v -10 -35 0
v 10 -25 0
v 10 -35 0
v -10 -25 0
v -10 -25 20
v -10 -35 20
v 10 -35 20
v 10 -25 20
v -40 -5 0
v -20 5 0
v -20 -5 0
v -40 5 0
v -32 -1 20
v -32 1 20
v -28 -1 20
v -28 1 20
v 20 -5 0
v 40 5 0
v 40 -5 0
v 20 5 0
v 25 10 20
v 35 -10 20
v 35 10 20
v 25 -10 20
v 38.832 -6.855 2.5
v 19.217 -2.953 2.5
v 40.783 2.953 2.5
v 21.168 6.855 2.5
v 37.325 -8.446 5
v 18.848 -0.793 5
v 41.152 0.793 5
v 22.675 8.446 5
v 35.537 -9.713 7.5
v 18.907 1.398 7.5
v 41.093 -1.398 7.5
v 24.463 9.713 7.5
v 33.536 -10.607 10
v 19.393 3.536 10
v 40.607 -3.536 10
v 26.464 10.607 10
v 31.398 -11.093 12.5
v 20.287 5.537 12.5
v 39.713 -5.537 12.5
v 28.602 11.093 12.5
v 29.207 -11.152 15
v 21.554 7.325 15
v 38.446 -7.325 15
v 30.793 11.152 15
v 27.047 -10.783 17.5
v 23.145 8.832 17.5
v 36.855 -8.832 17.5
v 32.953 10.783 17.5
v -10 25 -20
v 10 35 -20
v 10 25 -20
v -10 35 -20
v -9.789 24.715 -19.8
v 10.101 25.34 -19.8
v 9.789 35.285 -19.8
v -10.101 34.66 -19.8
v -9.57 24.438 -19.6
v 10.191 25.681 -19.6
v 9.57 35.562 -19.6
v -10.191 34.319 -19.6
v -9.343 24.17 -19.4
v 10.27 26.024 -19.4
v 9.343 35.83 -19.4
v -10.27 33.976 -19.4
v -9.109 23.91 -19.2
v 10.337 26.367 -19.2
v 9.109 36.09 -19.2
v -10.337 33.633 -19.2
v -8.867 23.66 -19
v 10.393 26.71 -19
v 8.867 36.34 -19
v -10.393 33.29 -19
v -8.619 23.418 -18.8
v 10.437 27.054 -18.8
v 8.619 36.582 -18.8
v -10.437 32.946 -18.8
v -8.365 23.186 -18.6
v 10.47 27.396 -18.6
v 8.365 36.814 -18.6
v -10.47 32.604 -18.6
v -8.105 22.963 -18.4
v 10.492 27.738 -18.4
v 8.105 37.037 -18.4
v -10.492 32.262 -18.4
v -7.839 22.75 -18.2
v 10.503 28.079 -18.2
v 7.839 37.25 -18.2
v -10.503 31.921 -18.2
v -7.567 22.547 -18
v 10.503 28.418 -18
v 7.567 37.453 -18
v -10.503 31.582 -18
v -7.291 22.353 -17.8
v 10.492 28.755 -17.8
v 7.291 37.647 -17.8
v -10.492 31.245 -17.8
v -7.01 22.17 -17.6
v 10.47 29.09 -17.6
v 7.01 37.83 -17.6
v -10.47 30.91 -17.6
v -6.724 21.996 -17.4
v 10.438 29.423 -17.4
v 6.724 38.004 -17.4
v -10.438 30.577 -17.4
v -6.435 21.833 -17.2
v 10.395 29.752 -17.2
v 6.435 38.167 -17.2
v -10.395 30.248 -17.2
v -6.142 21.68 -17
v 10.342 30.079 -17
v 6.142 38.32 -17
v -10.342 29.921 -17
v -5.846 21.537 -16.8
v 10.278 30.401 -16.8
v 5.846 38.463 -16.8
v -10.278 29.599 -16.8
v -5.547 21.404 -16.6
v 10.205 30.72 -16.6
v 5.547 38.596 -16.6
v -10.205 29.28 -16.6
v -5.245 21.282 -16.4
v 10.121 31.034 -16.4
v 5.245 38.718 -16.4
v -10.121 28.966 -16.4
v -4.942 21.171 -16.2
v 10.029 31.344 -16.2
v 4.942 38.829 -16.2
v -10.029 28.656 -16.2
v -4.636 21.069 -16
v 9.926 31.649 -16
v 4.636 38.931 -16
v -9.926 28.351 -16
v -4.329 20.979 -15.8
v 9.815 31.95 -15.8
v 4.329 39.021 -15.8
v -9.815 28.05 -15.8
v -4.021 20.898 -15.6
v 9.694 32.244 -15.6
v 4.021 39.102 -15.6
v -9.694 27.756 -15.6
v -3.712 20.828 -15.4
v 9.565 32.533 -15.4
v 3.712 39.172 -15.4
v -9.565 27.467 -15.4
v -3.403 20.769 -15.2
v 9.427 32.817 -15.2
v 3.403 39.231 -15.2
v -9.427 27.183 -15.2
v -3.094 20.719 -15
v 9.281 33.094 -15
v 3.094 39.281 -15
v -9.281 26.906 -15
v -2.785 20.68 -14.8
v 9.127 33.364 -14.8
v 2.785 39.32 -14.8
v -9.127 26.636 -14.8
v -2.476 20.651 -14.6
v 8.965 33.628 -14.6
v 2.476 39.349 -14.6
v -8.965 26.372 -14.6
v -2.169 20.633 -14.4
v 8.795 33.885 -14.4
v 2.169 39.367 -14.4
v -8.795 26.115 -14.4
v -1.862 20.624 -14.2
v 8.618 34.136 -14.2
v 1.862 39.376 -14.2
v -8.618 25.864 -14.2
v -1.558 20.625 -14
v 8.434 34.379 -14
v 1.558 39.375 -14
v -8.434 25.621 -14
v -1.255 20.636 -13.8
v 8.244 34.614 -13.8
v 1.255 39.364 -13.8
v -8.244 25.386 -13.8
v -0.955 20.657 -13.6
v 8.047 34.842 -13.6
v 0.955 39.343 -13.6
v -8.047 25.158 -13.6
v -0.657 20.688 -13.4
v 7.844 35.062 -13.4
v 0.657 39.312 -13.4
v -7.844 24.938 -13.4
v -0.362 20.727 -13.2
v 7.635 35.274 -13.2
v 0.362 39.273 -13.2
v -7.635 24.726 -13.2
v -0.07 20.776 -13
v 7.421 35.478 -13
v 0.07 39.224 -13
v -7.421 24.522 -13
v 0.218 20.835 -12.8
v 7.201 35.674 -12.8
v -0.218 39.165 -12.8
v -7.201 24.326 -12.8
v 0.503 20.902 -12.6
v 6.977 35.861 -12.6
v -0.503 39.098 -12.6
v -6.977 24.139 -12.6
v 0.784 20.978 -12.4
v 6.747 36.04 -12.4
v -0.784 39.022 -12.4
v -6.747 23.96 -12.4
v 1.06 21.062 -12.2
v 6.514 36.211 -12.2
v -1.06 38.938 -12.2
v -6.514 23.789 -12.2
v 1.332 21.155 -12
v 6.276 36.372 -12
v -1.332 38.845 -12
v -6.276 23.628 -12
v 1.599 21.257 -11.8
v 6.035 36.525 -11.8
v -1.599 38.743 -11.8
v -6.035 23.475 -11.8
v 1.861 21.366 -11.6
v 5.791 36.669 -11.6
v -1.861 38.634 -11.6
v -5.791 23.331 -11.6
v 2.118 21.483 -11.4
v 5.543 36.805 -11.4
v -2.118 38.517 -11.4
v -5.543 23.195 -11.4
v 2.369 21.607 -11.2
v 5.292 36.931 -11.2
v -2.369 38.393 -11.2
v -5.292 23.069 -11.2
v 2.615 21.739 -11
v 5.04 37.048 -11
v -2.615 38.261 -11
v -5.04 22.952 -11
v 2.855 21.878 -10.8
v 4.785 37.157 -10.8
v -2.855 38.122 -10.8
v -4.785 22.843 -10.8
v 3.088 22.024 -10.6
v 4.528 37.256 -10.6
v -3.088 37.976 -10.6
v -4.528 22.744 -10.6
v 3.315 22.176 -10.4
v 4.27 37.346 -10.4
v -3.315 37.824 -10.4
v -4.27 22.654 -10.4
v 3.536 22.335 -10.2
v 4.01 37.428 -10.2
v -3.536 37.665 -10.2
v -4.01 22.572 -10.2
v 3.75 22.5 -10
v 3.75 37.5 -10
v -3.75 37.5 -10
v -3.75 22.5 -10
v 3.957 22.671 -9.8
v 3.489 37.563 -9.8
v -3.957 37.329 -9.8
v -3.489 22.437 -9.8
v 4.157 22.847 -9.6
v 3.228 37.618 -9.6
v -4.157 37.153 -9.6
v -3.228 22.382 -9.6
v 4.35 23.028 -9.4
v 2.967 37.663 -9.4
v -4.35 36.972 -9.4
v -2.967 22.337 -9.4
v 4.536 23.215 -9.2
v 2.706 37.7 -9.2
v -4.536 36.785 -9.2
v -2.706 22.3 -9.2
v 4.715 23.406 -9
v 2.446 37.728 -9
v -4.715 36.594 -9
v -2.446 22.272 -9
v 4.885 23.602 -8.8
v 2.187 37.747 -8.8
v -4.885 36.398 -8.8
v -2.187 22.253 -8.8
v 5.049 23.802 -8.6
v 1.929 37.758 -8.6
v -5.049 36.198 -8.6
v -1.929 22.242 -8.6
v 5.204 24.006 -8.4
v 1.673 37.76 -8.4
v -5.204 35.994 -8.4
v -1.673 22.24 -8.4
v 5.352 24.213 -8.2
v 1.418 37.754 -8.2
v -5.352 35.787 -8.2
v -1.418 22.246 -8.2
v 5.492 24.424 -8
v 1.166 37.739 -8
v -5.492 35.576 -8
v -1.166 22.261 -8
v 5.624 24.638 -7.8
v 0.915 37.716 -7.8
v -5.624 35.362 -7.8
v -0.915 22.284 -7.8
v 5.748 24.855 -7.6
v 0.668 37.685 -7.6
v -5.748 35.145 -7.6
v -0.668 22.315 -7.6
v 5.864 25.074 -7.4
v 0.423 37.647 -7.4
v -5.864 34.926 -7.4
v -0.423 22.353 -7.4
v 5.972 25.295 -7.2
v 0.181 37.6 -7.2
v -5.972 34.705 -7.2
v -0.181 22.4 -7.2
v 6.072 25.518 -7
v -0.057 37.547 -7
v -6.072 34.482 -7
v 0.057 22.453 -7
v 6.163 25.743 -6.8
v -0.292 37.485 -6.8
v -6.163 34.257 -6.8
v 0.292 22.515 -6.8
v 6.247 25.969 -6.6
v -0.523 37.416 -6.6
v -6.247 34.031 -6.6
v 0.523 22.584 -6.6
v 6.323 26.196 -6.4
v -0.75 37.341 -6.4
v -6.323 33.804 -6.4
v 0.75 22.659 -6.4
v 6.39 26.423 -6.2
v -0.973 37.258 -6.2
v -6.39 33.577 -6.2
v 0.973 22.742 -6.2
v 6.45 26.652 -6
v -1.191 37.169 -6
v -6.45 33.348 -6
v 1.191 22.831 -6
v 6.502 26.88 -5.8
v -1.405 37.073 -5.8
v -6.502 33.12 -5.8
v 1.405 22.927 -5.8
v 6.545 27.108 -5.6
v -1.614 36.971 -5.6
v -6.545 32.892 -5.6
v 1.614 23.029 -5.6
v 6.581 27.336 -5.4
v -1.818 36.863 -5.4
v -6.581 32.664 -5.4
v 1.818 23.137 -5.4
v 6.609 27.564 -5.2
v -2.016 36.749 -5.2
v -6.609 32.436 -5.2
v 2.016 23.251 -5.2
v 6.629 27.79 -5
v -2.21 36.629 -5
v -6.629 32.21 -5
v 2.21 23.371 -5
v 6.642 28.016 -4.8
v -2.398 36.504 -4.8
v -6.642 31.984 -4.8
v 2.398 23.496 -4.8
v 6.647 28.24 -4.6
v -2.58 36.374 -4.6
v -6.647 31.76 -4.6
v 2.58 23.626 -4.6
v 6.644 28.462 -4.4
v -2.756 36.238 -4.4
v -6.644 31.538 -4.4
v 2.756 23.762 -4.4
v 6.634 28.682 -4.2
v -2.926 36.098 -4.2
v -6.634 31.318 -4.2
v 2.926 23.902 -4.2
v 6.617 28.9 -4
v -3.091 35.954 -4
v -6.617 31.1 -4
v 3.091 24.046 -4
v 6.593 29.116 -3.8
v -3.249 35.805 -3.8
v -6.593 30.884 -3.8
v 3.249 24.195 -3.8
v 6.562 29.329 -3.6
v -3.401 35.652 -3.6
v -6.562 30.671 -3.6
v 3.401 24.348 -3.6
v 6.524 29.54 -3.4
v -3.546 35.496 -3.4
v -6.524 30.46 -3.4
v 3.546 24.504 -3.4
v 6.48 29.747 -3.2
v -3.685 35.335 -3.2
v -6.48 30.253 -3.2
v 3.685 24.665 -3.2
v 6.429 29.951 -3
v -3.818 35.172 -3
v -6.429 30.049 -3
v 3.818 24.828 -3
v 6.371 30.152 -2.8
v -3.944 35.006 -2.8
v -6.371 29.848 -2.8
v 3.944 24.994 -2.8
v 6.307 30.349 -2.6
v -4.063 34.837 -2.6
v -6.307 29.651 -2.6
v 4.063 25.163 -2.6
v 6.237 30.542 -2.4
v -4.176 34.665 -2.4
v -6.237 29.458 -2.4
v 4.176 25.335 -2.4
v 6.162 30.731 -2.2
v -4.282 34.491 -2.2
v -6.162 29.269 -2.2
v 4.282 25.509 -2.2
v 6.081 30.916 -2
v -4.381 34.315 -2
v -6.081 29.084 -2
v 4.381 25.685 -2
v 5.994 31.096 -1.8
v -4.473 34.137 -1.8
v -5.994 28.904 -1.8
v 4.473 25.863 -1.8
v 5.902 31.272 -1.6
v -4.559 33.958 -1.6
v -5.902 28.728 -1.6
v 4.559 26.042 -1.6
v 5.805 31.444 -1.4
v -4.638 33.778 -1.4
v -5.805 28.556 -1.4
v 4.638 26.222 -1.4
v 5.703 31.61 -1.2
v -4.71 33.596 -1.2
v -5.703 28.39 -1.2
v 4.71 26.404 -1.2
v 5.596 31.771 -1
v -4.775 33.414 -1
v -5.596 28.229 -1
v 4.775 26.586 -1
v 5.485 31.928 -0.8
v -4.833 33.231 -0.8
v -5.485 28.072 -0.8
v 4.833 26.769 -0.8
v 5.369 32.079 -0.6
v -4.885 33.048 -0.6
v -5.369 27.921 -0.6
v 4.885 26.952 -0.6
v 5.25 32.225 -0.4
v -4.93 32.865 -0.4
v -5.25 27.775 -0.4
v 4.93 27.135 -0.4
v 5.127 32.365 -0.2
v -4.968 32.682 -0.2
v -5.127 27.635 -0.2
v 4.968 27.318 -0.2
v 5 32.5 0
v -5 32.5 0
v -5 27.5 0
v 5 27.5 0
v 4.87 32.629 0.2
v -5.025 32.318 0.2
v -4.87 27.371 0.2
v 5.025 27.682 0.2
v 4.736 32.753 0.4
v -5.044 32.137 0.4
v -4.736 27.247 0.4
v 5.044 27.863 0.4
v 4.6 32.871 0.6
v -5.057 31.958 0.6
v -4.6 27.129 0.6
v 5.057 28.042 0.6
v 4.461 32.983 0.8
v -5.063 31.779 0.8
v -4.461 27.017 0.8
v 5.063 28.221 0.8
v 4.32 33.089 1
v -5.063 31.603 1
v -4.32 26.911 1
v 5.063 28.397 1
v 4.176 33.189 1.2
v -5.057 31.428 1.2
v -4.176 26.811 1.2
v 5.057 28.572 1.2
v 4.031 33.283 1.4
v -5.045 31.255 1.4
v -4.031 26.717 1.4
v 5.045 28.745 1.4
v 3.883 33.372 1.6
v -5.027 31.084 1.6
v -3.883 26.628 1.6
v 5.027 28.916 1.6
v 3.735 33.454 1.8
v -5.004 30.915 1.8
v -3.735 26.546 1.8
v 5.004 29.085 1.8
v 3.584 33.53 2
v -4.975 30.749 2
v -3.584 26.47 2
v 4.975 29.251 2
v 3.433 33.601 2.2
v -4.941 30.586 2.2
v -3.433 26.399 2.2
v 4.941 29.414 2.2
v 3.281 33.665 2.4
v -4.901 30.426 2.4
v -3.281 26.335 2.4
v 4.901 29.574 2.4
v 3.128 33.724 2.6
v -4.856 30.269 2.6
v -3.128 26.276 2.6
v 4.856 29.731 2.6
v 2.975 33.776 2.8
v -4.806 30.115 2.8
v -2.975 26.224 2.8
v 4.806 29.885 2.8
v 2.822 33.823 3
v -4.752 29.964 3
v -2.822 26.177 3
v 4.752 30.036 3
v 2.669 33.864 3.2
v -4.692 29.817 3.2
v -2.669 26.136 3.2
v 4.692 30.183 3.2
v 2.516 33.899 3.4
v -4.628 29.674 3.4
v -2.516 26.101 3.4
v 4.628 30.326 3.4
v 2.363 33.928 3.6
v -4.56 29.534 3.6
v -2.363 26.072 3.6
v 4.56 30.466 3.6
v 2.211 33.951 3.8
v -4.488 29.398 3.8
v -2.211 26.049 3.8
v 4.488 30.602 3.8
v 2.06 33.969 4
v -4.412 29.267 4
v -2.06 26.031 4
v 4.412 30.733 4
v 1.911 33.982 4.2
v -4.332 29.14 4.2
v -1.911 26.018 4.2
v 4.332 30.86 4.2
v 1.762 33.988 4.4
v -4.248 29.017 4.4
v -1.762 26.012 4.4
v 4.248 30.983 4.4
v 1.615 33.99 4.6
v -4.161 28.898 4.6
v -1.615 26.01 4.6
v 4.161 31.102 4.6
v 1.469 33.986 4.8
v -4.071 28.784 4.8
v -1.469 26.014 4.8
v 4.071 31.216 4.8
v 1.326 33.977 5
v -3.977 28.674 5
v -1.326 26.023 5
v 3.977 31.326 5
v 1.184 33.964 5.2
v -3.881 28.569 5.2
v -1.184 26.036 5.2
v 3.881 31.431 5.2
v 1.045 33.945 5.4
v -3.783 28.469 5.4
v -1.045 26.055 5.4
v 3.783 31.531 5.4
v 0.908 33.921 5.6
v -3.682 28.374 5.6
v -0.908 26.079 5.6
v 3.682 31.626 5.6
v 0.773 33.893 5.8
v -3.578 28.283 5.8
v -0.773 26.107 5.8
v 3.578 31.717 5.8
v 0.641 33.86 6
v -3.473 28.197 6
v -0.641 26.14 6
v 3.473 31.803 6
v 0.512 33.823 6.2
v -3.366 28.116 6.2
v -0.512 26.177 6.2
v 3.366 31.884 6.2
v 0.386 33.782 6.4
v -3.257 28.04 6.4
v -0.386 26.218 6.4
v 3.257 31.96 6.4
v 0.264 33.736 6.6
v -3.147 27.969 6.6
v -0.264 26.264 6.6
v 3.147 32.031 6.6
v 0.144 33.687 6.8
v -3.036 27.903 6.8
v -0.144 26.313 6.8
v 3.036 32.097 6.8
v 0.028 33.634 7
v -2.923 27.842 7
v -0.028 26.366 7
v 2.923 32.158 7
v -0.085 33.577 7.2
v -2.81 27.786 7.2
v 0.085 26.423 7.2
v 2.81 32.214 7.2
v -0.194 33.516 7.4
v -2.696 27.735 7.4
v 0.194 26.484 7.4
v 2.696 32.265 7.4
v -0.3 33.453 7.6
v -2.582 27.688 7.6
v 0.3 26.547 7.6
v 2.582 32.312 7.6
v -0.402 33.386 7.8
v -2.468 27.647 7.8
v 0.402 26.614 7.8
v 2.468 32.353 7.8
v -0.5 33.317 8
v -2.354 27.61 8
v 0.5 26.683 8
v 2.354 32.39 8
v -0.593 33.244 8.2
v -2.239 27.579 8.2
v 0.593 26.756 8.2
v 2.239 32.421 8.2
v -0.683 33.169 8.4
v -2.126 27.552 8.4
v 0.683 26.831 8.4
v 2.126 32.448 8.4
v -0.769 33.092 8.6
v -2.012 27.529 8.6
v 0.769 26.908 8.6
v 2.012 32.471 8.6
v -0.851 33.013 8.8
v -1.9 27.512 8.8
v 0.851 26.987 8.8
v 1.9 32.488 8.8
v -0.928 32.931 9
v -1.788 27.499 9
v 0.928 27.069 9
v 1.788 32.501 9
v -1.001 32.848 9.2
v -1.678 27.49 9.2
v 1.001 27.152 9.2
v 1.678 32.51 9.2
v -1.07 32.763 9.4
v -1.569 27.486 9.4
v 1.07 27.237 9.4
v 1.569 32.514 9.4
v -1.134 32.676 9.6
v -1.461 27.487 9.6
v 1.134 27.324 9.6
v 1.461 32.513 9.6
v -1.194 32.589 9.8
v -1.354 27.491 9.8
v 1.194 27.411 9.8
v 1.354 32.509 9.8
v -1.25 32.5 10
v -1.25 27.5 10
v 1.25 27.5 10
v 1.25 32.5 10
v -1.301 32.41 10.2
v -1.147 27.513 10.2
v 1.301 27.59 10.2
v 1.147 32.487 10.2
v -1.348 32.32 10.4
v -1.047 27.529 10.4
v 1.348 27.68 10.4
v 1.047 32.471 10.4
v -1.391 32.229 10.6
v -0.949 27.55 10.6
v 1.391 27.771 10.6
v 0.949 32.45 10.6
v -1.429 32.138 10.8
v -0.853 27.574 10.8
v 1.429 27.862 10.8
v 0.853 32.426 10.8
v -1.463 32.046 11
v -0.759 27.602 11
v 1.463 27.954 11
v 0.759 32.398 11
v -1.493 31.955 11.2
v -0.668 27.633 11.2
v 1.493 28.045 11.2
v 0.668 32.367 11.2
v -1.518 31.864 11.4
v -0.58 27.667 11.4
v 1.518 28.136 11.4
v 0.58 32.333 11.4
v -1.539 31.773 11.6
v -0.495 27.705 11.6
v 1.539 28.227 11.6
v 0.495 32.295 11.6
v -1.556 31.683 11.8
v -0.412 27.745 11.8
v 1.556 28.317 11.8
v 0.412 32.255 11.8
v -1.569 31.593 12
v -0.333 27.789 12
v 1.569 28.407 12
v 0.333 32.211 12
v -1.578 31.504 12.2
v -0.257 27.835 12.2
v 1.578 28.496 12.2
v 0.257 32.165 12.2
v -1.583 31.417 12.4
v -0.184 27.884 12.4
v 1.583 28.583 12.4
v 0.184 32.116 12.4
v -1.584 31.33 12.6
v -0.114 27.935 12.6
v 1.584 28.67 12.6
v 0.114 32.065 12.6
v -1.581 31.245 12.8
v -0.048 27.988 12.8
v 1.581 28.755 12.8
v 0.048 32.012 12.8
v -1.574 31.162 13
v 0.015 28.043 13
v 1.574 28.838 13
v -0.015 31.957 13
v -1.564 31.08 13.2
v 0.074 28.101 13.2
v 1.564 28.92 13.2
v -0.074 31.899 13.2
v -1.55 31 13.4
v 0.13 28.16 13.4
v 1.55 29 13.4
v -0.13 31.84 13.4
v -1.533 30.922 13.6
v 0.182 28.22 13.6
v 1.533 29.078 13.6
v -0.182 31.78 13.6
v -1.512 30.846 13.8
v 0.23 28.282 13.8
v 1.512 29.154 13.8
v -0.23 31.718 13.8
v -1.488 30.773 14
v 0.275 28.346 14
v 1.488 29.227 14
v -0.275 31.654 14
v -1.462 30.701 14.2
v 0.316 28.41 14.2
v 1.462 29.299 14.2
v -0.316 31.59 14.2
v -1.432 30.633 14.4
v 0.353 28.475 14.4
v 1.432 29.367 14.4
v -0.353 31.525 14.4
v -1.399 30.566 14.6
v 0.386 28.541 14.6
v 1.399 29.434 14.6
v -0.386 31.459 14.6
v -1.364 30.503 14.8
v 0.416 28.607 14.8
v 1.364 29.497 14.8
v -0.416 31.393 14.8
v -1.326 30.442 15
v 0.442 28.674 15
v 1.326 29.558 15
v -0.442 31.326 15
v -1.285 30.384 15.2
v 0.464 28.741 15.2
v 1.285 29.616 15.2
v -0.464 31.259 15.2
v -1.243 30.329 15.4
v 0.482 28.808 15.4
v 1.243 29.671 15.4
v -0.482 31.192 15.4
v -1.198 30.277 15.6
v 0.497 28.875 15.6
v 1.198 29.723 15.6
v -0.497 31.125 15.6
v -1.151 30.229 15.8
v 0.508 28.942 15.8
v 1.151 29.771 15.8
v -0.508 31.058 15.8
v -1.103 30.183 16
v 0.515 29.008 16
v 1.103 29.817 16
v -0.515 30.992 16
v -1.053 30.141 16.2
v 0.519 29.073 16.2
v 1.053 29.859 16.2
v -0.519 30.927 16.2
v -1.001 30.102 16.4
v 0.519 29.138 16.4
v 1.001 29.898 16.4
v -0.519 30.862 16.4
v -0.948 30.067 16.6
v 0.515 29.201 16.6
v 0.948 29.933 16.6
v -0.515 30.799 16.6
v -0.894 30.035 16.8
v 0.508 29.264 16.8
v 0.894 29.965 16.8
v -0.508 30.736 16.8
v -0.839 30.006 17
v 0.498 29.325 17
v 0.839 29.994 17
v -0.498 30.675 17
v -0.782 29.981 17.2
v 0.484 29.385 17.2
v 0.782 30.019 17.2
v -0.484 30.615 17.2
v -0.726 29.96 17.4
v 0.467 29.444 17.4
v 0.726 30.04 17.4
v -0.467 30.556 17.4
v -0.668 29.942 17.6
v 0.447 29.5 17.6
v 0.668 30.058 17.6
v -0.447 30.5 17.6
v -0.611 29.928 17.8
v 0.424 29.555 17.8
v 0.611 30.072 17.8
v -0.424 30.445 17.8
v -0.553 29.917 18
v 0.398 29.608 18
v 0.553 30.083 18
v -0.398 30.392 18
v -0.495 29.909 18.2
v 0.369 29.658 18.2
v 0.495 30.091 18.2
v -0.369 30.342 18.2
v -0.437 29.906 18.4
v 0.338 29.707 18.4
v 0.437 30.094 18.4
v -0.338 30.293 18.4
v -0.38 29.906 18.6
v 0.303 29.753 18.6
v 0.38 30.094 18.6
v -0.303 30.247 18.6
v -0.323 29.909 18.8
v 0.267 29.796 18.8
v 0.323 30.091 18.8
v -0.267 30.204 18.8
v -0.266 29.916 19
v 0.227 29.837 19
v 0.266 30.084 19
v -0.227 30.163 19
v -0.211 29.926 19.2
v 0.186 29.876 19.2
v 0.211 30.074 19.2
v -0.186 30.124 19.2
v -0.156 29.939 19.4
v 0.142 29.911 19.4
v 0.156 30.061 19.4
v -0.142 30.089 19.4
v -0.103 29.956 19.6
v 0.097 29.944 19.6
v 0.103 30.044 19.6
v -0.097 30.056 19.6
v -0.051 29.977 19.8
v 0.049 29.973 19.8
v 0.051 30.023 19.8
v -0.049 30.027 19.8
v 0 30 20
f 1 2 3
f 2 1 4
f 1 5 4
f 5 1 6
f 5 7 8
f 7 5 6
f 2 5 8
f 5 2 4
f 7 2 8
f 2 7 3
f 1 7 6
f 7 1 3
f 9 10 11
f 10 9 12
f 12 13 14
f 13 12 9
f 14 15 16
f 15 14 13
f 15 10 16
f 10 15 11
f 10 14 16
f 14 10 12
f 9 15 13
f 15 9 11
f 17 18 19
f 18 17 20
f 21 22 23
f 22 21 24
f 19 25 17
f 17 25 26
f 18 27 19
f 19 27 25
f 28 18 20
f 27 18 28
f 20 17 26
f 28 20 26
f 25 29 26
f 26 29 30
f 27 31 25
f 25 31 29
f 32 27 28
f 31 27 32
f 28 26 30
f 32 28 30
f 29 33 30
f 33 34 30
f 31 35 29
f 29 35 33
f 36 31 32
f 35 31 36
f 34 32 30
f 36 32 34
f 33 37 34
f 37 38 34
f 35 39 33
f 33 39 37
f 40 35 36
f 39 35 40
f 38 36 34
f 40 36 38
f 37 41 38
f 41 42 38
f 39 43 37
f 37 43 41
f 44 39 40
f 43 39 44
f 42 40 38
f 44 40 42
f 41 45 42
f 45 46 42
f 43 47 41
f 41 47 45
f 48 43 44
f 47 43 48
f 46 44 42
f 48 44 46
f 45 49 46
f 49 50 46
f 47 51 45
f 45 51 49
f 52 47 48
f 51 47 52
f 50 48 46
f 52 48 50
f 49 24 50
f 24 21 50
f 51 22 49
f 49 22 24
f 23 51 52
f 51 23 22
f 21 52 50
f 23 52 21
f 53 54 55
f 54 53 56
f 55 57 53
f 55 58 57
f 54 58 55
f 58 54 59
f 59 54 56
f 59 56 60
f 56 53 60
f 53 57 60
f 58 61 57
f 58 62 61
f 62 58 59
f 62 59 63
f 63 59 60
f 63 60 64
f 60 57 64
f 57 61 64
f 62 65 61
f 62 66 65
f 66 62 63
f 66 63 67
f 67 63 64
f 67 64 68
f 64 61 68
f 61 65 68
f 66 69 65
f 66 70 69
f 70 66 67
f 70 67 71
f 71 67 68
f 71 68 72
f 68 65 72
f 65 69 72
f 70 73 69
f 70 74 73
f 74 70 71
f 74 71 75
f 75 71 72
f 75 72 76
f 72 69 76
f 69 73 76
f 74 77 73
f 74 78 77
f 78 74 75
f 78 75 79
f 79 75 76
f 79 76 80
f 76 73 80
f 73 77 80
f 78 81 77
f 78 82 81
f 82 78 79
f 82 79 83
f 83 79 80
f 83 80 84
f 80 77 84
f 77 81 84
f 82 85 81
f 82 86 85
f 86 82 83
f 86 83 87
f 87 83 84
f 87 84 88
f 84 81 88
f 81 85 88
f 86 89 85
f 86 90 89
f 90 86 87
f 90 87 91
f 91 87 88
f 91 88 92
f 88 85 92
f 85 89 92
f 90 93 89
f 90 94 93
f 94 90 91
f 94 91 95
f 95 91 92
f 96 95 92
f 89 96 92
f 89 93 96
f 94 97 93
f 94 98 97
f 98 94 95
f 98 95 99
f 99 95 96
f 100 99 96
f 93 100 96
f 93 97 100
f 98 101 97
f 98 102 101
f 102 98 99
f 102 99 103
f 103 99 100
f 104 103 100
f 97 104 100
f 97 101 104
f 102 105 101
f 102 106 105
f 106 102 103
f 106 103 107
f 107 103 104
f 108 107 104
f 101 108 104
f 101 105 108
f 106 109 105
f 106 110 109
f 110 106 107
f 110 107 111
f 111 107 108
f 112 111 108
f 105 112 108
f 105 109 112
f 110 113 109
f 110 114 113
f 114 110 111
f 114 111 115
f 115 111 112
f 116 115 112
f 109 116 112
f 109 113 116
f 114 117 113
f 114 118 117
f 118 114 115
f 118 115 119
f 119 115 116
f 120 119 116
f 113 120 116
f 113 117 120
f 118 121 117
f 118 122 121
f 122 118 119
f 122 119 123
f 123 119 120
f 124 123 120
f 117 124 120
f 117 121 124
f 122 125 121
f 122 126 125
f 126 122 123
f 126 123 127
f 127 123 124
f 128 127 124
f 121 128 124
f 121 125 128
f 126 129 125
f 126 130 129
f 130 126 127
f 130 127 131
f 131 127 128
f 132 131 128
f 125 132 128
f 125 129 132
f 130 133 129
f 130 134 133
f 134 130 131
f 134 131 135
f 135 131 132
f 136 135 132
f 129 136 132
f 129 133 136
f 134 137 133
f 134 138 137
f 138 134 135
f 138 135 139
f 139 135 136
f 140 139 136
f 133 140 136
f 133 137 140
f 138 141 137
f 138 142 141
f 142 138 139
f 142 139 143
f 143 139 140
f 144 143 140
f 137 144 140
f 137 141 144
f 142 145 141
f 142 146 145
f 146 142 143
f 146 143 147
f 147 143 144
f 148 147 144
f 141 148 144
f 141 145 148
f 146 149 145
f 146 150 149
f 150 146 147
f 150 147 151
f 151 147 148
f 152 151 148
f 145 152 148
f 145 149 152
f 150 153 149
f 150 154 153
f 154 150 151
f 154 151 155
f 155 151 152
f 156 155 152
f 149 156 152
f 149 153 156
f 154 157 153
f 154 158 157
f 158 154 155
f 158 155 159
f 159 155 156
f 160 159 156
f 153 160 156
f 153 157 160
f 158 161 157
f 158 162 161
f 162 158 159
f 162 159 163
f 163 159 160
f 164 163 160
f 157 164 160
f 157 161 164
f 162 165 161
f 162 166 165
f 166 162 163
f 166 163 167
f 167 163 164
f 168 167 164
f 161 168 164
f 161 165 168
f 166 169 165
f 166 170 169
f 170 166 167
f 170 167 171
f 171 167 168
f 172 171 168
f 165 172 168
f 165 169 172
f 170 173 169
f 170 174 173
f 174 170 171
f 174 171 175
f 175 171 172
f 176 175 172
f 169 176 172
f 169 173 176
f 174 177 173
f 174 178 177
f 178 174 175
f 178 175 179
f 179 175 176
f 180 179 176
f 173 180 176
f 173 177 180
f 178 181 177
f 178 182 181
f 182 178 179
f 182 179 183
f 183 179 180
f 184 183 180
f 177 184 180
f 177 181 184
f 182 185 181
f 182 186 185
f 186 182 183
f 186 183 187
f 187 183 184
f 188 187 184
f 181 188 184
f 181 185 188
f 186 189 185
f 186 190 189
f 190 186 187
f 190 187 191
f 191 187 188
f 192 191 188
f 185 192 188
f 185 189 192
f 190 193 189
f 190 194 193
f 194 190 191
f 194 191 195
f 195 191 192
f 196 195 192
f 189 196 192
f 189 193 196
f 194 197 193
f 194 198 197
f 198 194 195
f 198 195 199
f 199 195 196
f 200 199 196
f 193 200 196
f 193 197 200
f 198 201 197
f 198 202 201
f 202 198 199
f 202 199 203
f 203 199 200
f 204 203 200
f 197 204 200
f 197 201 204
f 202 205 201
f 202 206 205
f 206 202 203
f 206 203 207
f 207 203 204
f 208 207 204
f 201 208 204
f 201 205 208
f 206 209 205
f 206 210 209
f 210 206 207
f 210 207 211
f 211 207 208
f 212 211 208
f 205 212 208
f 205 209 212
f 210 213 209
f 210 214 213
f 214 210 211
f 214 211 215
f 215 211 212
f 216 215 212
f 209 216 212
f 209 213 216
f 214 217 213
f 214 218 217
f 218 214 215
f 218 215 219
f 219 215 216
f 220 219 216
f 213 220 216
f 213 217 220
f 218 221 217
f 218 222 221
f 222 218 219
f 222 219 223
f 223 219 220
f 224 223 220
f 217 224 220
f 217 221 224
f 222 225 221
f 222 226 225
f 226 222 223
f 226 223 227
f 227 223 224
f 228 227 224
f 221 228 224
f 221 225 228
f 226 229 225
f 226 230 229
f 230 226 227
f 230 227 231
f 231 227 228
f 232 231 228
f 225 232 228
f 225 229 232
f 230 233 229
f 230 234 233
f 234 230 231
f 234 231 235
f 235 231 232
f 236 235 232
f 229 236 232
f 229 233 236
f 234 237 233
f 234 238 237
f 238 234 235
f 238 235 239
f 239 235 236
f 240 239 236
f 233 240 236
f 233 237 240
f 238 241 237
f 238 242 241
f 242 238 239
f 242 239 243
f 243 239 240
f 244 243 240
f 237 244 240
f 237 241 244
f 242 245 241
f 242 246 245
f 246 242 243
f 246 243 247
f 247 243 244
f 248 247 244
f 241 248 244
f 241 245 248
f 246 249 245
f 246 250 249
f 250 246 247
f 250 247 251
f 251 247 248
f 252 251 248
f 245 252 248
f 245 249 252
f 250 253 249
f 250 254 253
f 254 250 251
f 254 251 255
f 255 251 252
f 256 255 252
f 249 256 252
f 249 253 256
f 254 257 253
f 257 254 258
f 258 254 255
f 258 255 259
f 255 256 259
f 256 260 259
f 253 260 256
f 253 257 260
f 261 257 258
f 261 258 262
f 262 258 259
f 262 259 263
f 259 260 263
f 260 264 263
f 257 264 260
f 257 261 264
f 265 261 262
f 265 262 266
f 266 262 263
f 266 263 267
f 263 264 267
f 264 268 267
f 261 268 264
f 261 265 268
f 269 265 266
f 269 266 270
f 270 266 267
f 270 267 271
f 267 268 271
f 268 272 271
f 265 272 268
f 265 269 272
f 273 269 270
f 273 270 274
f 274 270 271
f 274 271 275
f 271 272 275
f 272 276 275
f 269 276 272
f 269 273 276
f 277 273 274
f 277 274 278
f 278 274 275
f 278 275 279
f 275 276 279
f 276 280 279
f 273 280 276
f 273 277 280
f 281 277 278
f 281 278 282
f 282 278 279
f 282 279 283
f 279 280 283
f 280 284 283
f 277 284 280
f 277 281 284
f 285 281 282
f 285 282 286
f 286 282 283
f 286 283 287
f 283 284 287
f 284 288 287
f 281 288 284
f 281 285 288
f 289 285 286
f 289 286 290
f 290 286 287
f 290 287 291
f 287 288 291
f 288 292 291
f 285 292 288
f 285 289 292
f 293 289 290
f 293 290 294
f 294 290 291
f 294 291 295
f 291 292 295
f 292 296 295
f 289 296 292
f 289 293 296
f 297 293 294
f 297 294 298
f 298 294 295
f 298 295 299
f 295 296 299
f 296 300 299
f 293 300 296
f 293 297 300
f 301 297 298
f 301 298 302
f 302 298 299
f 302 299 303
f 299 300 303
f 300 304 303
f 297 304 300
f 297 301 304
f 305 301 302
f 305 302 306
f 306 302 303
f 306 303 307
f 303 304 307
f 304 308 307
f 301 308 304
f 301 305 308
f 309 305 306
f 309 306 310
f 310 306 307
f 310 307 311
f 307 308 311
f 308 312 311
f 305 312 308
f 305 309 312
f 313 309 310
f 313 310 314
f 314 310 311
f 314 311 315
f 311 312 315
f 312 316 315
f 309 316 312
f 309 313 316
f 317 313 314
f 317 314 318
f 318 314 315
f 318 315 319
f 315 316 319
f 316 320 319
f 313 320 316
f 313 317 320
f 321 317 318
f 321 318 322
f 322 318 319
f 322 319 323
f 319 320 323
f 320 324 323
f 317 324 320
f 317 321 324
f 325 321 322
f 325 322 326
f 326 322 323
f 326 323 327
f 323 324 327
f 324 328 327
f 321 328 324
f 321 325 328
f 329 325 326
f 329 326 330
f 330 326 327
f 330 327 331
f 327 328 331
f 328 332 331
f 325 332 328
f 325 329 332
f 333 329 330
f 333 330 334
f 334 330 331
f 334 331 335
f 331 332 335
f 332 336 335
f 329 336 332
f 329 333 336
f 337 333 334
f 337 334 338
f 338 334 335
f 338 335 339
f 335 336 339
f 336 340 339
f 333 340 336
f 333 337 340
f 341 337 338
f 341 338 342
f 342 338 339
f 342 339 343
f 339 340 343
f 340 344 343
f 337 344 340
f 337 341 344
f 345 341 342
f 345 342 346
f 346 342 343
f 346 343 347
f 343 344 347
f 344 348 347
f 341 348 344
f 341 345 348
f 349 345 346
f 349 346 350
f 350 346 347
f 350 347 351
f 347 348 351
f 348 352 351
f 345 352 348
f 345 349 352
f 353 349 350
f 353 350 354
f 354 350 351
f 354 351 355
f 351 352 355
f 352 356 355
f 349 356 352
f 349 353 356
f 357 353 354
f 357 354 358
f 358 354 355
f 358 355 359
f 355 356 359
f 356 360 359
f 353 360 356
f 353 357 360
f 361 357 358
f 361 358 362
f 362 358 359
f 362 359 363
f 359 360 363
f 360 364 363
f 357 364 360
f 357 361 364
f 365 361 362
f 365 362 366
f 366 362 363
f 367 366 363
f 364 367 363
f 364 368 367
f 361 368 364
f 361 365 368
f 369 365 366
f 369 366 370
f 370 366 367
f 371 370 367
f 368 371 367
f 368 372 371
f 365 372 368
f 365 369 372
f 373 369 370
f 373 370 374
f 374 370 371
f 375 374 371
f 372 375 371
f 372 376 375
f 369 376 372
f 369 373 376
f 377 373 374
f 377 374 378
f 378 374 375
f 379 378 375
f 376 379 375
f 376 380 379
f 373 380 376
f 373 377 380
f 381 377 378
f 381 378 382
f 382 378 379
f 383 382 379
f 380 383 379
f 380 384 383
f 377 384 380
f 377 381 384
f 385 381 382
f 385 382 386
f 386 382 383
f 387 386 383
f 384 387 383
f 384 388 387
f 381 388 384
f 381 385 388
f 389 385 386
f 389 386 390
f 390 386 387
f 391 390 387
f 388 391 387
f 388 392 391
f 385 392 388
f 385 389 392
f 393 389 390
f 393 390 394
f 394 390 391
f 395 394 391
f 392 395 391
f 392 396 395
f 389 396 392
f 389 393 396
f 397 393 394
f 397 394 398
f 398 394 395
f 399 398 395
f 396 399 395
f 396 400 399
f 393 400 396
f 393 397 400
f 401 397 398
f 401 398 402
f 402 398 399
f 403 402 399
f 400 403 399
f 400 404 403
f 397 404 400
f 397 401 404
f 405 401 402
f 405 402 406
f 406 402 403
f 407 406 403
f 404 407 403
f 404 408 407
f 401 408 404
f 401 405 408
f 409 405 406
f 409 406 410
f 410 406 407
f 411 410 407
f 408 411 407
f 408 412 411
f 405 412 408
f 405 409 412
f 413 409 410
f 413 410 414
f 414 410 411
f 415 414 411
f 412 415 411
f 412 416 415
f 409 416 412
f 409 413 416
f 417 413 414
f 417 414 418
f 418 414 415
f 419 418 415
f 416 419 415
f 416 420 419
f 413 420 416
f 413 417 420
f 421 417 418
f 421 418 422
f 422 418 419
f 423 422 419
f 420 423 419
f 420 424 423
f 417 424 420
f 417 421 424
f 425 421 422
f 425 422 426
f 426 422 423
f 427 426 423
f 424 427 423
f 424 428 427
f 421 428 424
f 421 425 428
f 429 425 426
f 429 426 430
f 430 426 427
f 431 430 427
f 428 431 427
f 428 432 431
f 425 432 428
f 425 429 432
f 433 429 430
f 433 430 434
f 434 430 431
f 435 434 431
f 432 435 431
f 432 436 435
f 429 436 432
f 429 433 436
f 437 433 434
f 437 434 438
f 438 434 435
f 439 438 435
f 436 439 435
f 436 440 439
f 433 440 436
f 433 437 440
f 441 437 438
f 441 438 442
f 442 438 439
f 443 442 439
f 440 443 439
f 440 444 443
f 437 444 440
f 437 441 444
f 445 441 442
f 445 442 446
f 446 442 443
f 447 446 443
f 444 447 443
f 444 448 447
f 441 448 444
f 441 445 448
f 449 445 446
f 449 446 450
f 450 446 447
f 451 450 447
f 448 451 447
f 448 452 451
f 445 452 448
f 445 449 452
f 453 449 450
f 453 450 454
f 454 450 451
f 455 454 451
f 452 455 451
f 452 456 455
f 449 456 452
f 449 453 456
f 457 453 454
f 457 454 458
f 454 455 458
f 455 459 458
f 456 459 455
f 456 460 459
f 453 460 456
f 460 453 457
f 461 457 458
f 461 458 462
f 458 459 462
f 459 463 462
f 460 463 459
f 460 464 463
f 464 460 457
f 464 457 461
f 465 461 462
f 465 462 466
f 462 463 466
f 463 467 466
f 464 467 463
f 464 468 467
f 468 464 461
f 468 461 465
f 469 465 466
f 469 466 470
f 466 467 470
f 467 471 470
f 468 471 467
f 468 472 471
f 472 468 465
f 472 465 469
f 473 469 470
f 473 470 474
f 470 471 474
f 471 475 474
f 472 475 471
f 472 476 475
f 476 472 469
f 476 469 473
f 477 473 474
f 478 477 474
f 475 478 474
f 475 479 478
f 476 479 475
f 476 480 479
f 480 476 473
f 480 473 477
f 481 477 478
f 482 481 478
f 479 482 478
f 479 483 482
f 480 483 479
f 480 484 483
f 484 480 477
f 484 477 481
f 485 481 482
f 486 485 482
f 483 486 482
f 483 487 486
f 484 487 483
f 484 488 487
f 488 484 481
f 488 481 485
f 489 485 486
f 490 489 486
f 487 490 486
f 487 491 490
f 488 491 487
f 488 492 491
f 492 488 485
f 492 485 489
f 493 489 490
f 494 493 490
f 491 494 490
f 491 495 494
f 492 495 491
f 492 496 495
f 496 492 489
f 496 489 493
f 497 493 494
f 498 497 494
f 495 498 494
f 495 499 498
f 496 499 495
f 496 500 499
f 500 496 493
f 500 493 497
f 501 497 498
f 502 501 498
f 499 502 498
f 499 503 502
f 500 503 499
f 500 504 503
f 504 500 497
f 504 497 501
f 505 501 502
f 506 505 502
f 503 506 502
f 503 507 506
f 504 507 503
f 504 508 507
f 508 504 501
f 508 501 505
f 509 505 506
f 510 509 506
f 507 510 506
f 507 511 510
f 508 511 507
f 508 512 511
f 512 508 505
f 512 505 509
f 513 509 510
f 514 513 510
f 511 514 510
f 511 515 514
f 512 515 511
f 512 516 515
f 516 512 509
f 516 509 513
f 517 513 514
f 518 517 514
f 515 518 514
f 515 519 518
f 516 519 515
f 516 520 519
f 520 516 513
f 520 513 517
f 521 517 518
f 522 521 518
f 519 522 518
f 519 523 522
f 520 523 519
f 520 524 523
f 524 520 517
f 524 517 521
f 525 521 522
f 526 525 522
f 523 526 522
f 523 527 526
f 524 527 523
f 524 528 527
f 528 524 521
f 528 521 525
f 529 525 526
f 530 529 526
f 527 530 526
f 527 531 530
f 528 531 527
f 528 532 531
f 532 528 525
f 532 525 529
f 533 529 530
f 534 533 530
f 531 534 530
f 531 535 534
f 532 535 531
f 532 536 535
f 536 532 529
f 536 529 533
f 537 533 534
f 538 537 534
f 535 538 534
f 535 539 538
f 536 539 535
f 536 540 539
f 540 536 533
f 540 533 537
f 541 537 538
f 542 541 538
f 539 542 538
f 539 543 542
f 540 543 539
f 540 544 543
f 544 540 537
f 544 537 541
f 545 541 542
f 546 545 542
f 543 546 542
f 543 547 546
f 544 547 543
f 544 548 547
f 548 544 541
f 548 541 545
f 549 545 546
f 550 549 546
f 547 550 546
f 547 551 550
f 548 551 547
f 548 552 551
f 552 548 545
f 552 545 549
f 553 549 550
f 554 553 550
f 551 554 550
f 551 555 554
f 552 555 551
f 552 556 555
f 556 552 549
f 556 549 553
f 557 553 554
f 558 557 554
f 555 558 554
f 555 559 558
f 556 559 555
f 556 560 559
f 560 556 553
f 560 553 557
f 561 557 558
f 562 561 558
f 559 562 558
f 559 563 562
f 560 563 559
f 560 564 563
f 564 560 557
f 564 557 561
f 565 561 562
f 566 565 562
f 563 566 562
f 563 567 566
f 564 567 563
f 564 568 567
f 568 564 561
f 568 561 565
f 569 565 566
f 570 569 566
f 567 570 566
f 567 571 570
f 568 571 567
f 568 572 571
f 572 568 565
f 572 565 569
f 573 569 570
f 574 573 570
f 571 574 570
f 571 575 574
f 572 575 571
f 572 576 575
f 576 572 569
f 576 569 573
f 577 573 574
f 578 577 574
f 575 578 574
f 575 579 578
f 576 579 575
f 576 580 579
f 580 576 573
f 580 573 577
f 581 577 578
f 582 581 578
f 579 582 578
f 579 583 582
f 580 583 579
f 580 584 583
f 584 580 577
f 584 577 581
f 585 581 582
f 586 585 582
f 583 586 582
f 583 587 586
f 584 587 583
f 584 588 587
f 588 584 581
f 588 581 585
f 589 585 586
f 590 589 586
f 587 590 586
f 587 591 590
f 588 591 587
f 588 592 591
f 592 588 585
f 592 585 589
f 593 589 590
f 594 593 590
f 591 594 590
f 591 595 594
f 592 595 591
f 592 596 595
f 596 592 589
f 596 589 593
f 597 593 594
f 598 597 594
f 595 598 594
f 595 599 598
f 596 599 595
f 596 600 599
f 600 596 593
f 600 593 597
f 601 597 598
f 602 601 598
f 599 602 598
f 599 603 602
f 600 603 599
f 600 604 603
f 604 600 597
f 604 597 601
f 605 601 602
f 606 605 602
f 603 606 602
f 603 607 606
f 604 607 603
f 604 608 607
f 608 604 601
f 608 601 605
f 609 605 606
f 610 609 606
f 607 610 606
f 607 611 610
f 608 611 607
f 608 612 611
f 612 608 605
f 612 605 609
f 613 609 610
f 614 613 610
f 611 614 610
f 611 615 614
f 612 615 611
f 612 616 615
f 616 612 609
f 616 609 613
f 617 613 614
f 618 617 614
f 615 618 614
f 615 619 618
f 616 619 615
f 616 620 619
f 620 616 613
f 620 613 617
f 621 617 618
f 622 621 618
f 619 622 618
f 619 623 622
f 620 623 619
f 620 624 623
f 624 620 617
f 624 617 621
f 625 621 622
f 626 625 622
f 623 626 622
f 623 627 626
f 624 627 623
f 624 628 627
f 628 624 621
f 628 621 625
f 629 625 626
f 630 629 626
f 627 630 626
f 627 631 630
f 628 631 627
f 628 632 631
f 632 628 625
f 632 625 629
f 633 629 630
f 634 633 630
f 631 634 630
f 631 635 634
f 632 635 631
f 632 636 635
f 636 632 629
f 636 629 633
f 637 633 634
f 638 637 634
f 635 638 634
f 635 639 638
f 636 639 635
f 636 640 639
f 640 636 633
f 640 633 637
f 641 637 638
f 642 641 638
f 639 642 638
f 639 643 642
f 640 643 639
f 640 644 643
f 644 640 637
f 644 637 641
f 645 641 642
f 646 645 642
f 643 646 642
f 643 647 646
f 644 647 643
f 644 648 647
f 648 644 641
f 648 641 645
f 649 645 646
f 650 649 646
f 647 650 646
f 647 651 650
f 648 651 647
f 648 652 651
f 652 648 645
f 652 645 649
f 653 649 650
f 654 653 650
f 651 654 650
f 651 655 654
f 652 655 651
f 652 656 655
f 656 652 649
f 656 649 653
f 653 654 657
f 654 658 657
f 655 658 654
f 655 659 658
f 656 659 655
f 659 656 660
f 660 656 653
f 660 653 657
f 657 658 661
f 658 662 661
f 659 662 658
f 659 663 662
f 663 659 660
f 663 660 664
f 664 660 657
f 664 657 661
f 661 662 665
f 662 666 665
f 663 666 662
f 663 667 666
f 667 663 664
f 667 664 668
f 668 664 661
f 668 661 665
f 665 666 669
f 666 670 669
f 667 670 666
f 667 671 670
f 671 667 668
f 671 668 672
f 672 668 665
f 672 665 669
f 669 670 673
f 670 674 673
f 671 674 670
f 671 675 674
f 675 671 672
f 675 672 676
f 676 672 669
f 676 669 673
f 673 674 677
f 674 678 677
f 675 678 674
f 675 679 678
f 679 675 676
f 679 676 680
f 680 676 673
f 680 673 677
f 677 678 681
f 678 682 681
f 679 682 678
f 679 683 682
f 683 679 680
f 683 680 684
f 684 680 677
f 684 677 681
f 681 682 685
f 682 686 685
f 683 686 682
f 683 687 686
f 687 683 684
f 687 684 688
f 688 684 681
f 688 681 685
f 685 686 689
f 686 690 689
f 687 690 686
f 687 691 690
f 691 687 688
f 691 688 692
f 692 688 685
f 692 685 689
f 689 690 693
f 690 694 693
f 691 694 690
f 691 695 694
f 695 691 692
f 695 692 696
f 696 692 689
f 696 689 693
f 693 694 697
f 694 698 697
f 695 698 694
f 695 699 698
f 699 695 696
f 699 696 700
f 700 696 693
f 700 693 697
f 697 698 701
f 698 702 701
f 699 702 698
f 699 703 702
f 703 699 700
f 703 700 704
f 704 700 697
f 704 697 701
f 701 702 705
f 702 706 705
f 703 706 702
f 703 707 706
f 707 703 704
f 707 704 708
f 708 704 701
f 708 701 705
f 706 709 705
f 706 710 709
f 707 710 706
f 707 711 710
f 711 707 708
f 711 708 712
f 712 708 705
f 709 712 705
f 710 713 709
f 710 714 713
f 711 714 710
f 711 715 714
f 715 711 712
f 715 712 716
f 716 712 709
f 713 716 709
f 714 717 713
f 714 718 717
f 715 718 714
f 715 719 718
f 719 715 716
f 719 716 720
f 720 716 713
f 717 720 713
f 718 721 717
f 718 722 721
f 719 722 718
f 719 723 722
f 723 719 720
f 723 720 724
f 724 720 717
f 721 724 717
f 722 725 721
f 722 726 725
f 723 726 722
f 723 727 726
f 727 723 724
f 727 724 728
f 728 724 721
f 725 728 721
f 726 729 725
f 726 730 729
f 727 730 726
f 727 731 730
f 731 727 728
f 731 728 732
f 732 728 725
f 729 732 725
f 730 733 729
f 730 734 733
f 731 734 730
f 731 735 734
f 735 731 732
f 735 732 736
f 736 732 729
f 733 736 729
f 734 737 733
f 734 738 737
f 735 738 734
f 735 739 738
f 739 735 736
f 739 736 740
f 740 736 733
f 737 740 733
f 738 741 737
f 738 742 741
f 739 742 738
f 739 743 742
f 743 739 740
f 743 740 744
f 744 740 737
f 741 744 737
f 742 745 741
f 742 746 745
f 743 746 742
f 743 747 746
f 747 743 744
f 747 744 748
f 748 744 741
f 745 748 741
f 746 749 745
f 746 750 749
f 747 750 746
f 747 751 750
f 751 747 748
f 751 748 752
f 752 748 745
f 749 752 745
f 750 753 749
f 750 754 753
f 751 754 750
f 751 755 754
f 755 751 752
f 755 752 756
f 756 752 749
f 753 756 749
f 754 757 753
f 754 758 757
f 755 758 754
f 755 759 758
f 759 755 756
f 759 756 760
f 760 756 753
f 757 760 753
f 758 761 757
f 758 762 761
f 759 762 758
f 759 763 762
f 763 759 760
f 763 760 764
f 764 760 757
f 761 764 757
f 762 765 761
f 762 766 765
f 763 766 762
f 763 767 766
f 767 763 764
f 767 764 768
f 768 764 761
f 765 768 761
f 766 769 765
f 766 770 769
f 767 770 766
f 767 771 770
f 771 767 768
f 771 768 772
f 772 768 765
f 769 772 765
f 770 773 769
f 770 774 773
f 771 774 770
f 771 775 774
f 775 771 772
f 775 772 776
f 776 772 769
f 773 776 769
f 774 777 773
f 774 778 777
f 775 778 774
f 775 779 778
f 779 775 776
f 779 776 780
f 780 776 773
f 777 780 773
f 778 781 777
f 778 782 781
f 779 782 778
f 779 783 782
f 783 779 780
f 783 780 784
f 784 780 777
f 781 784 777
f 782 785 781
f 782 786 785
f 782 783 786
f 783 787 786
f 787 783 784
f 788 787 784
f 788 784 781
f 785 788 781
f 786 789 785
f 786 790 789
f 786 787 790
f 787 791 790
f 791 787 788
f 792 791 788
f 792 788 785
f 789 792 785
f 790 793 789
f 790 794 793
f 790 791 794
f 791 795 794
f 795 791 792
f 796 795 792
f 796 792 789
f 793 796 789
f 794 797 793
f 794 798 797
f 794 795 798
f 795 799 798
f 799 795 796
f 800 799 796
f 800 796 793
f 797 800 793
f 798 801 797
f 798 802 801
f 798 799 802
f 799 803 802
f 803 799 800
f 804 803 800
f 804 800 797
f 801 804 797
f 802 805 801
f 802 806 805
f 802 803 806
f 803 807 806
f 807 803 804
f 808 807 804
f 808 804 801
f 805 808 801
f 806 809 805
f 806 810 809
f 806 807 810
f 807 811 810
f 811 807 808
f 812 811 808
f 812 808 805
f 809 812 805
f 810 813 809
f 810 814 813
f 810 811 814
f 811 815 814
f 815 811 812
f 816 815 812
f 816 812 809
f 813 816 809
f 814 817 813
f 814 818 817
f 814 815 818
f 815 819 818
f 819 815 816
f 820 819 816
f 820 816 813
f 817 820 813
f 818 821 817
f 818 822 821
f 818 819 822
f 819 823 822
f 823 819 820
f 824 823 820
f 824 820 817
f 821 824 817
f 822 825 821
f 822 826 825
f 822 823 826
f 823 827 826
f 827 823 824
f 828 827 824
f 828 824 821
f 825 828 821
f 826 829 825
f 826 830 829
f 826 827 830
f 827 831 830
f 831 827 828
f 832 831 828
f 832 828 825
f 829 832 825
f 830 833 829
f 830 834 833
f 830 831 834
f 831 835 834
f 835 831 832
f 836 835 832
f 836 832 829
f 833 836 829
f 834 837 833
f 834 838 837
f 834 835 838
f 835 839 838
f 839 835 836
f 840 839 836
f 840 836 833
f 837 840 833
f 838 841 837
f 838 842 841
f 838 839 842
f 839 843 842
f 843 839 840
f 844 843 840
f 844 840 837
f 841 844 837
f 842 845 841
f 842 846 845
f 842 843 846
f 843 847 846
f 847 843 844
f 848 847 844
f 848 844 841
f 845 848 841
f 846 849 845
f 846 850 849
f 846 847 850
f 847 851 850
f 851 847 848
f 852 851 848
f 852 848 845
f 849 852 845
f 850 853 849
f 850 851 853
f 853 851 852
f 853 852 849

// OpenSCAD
echo(version = version());

// simple 2D -> 3D extrusion of a rectangle
color("red")
    translate([0, -30, 0])
        linear_extrude(height = 20)
            square([20, 10], center = true);

// using the scale parameter a frustum can be constructed
color("green")
    translate([-30, 0, 0])
        linear_extrude(height = 20, scale = 0.2)
            square([20, 10], center = true);

// with twist the extruded shape will rotate around the Z axis
color("cyan")
    translate([30, 0, 0])
        linear_extrude(height = 20, twist = 90)
            square([20, 10], center = true);

// combining both relatively complex shapes can be created
color("gray")
    translate([0, 30, 0])
        linear_extrude(height = 40, twist = -360, scale = 0, center = true, slices = 200)
            square([20, 10], center = true);

// Written in 2015 by Torsten Paul <Torsten.Paul@gmx.de>
//
// To the extent possible under law, the author(s) have dedicated all
// copyright and related and neighboring rights to this software to the
// public domain worldwide. This software is distributed without any
// warranty.
//
// You should have received a copy of the CC0 Public Domain
// Dedication along with this software.
// If not, see <http://creativecommons.org/publicdomain/zero/1.0/>.
